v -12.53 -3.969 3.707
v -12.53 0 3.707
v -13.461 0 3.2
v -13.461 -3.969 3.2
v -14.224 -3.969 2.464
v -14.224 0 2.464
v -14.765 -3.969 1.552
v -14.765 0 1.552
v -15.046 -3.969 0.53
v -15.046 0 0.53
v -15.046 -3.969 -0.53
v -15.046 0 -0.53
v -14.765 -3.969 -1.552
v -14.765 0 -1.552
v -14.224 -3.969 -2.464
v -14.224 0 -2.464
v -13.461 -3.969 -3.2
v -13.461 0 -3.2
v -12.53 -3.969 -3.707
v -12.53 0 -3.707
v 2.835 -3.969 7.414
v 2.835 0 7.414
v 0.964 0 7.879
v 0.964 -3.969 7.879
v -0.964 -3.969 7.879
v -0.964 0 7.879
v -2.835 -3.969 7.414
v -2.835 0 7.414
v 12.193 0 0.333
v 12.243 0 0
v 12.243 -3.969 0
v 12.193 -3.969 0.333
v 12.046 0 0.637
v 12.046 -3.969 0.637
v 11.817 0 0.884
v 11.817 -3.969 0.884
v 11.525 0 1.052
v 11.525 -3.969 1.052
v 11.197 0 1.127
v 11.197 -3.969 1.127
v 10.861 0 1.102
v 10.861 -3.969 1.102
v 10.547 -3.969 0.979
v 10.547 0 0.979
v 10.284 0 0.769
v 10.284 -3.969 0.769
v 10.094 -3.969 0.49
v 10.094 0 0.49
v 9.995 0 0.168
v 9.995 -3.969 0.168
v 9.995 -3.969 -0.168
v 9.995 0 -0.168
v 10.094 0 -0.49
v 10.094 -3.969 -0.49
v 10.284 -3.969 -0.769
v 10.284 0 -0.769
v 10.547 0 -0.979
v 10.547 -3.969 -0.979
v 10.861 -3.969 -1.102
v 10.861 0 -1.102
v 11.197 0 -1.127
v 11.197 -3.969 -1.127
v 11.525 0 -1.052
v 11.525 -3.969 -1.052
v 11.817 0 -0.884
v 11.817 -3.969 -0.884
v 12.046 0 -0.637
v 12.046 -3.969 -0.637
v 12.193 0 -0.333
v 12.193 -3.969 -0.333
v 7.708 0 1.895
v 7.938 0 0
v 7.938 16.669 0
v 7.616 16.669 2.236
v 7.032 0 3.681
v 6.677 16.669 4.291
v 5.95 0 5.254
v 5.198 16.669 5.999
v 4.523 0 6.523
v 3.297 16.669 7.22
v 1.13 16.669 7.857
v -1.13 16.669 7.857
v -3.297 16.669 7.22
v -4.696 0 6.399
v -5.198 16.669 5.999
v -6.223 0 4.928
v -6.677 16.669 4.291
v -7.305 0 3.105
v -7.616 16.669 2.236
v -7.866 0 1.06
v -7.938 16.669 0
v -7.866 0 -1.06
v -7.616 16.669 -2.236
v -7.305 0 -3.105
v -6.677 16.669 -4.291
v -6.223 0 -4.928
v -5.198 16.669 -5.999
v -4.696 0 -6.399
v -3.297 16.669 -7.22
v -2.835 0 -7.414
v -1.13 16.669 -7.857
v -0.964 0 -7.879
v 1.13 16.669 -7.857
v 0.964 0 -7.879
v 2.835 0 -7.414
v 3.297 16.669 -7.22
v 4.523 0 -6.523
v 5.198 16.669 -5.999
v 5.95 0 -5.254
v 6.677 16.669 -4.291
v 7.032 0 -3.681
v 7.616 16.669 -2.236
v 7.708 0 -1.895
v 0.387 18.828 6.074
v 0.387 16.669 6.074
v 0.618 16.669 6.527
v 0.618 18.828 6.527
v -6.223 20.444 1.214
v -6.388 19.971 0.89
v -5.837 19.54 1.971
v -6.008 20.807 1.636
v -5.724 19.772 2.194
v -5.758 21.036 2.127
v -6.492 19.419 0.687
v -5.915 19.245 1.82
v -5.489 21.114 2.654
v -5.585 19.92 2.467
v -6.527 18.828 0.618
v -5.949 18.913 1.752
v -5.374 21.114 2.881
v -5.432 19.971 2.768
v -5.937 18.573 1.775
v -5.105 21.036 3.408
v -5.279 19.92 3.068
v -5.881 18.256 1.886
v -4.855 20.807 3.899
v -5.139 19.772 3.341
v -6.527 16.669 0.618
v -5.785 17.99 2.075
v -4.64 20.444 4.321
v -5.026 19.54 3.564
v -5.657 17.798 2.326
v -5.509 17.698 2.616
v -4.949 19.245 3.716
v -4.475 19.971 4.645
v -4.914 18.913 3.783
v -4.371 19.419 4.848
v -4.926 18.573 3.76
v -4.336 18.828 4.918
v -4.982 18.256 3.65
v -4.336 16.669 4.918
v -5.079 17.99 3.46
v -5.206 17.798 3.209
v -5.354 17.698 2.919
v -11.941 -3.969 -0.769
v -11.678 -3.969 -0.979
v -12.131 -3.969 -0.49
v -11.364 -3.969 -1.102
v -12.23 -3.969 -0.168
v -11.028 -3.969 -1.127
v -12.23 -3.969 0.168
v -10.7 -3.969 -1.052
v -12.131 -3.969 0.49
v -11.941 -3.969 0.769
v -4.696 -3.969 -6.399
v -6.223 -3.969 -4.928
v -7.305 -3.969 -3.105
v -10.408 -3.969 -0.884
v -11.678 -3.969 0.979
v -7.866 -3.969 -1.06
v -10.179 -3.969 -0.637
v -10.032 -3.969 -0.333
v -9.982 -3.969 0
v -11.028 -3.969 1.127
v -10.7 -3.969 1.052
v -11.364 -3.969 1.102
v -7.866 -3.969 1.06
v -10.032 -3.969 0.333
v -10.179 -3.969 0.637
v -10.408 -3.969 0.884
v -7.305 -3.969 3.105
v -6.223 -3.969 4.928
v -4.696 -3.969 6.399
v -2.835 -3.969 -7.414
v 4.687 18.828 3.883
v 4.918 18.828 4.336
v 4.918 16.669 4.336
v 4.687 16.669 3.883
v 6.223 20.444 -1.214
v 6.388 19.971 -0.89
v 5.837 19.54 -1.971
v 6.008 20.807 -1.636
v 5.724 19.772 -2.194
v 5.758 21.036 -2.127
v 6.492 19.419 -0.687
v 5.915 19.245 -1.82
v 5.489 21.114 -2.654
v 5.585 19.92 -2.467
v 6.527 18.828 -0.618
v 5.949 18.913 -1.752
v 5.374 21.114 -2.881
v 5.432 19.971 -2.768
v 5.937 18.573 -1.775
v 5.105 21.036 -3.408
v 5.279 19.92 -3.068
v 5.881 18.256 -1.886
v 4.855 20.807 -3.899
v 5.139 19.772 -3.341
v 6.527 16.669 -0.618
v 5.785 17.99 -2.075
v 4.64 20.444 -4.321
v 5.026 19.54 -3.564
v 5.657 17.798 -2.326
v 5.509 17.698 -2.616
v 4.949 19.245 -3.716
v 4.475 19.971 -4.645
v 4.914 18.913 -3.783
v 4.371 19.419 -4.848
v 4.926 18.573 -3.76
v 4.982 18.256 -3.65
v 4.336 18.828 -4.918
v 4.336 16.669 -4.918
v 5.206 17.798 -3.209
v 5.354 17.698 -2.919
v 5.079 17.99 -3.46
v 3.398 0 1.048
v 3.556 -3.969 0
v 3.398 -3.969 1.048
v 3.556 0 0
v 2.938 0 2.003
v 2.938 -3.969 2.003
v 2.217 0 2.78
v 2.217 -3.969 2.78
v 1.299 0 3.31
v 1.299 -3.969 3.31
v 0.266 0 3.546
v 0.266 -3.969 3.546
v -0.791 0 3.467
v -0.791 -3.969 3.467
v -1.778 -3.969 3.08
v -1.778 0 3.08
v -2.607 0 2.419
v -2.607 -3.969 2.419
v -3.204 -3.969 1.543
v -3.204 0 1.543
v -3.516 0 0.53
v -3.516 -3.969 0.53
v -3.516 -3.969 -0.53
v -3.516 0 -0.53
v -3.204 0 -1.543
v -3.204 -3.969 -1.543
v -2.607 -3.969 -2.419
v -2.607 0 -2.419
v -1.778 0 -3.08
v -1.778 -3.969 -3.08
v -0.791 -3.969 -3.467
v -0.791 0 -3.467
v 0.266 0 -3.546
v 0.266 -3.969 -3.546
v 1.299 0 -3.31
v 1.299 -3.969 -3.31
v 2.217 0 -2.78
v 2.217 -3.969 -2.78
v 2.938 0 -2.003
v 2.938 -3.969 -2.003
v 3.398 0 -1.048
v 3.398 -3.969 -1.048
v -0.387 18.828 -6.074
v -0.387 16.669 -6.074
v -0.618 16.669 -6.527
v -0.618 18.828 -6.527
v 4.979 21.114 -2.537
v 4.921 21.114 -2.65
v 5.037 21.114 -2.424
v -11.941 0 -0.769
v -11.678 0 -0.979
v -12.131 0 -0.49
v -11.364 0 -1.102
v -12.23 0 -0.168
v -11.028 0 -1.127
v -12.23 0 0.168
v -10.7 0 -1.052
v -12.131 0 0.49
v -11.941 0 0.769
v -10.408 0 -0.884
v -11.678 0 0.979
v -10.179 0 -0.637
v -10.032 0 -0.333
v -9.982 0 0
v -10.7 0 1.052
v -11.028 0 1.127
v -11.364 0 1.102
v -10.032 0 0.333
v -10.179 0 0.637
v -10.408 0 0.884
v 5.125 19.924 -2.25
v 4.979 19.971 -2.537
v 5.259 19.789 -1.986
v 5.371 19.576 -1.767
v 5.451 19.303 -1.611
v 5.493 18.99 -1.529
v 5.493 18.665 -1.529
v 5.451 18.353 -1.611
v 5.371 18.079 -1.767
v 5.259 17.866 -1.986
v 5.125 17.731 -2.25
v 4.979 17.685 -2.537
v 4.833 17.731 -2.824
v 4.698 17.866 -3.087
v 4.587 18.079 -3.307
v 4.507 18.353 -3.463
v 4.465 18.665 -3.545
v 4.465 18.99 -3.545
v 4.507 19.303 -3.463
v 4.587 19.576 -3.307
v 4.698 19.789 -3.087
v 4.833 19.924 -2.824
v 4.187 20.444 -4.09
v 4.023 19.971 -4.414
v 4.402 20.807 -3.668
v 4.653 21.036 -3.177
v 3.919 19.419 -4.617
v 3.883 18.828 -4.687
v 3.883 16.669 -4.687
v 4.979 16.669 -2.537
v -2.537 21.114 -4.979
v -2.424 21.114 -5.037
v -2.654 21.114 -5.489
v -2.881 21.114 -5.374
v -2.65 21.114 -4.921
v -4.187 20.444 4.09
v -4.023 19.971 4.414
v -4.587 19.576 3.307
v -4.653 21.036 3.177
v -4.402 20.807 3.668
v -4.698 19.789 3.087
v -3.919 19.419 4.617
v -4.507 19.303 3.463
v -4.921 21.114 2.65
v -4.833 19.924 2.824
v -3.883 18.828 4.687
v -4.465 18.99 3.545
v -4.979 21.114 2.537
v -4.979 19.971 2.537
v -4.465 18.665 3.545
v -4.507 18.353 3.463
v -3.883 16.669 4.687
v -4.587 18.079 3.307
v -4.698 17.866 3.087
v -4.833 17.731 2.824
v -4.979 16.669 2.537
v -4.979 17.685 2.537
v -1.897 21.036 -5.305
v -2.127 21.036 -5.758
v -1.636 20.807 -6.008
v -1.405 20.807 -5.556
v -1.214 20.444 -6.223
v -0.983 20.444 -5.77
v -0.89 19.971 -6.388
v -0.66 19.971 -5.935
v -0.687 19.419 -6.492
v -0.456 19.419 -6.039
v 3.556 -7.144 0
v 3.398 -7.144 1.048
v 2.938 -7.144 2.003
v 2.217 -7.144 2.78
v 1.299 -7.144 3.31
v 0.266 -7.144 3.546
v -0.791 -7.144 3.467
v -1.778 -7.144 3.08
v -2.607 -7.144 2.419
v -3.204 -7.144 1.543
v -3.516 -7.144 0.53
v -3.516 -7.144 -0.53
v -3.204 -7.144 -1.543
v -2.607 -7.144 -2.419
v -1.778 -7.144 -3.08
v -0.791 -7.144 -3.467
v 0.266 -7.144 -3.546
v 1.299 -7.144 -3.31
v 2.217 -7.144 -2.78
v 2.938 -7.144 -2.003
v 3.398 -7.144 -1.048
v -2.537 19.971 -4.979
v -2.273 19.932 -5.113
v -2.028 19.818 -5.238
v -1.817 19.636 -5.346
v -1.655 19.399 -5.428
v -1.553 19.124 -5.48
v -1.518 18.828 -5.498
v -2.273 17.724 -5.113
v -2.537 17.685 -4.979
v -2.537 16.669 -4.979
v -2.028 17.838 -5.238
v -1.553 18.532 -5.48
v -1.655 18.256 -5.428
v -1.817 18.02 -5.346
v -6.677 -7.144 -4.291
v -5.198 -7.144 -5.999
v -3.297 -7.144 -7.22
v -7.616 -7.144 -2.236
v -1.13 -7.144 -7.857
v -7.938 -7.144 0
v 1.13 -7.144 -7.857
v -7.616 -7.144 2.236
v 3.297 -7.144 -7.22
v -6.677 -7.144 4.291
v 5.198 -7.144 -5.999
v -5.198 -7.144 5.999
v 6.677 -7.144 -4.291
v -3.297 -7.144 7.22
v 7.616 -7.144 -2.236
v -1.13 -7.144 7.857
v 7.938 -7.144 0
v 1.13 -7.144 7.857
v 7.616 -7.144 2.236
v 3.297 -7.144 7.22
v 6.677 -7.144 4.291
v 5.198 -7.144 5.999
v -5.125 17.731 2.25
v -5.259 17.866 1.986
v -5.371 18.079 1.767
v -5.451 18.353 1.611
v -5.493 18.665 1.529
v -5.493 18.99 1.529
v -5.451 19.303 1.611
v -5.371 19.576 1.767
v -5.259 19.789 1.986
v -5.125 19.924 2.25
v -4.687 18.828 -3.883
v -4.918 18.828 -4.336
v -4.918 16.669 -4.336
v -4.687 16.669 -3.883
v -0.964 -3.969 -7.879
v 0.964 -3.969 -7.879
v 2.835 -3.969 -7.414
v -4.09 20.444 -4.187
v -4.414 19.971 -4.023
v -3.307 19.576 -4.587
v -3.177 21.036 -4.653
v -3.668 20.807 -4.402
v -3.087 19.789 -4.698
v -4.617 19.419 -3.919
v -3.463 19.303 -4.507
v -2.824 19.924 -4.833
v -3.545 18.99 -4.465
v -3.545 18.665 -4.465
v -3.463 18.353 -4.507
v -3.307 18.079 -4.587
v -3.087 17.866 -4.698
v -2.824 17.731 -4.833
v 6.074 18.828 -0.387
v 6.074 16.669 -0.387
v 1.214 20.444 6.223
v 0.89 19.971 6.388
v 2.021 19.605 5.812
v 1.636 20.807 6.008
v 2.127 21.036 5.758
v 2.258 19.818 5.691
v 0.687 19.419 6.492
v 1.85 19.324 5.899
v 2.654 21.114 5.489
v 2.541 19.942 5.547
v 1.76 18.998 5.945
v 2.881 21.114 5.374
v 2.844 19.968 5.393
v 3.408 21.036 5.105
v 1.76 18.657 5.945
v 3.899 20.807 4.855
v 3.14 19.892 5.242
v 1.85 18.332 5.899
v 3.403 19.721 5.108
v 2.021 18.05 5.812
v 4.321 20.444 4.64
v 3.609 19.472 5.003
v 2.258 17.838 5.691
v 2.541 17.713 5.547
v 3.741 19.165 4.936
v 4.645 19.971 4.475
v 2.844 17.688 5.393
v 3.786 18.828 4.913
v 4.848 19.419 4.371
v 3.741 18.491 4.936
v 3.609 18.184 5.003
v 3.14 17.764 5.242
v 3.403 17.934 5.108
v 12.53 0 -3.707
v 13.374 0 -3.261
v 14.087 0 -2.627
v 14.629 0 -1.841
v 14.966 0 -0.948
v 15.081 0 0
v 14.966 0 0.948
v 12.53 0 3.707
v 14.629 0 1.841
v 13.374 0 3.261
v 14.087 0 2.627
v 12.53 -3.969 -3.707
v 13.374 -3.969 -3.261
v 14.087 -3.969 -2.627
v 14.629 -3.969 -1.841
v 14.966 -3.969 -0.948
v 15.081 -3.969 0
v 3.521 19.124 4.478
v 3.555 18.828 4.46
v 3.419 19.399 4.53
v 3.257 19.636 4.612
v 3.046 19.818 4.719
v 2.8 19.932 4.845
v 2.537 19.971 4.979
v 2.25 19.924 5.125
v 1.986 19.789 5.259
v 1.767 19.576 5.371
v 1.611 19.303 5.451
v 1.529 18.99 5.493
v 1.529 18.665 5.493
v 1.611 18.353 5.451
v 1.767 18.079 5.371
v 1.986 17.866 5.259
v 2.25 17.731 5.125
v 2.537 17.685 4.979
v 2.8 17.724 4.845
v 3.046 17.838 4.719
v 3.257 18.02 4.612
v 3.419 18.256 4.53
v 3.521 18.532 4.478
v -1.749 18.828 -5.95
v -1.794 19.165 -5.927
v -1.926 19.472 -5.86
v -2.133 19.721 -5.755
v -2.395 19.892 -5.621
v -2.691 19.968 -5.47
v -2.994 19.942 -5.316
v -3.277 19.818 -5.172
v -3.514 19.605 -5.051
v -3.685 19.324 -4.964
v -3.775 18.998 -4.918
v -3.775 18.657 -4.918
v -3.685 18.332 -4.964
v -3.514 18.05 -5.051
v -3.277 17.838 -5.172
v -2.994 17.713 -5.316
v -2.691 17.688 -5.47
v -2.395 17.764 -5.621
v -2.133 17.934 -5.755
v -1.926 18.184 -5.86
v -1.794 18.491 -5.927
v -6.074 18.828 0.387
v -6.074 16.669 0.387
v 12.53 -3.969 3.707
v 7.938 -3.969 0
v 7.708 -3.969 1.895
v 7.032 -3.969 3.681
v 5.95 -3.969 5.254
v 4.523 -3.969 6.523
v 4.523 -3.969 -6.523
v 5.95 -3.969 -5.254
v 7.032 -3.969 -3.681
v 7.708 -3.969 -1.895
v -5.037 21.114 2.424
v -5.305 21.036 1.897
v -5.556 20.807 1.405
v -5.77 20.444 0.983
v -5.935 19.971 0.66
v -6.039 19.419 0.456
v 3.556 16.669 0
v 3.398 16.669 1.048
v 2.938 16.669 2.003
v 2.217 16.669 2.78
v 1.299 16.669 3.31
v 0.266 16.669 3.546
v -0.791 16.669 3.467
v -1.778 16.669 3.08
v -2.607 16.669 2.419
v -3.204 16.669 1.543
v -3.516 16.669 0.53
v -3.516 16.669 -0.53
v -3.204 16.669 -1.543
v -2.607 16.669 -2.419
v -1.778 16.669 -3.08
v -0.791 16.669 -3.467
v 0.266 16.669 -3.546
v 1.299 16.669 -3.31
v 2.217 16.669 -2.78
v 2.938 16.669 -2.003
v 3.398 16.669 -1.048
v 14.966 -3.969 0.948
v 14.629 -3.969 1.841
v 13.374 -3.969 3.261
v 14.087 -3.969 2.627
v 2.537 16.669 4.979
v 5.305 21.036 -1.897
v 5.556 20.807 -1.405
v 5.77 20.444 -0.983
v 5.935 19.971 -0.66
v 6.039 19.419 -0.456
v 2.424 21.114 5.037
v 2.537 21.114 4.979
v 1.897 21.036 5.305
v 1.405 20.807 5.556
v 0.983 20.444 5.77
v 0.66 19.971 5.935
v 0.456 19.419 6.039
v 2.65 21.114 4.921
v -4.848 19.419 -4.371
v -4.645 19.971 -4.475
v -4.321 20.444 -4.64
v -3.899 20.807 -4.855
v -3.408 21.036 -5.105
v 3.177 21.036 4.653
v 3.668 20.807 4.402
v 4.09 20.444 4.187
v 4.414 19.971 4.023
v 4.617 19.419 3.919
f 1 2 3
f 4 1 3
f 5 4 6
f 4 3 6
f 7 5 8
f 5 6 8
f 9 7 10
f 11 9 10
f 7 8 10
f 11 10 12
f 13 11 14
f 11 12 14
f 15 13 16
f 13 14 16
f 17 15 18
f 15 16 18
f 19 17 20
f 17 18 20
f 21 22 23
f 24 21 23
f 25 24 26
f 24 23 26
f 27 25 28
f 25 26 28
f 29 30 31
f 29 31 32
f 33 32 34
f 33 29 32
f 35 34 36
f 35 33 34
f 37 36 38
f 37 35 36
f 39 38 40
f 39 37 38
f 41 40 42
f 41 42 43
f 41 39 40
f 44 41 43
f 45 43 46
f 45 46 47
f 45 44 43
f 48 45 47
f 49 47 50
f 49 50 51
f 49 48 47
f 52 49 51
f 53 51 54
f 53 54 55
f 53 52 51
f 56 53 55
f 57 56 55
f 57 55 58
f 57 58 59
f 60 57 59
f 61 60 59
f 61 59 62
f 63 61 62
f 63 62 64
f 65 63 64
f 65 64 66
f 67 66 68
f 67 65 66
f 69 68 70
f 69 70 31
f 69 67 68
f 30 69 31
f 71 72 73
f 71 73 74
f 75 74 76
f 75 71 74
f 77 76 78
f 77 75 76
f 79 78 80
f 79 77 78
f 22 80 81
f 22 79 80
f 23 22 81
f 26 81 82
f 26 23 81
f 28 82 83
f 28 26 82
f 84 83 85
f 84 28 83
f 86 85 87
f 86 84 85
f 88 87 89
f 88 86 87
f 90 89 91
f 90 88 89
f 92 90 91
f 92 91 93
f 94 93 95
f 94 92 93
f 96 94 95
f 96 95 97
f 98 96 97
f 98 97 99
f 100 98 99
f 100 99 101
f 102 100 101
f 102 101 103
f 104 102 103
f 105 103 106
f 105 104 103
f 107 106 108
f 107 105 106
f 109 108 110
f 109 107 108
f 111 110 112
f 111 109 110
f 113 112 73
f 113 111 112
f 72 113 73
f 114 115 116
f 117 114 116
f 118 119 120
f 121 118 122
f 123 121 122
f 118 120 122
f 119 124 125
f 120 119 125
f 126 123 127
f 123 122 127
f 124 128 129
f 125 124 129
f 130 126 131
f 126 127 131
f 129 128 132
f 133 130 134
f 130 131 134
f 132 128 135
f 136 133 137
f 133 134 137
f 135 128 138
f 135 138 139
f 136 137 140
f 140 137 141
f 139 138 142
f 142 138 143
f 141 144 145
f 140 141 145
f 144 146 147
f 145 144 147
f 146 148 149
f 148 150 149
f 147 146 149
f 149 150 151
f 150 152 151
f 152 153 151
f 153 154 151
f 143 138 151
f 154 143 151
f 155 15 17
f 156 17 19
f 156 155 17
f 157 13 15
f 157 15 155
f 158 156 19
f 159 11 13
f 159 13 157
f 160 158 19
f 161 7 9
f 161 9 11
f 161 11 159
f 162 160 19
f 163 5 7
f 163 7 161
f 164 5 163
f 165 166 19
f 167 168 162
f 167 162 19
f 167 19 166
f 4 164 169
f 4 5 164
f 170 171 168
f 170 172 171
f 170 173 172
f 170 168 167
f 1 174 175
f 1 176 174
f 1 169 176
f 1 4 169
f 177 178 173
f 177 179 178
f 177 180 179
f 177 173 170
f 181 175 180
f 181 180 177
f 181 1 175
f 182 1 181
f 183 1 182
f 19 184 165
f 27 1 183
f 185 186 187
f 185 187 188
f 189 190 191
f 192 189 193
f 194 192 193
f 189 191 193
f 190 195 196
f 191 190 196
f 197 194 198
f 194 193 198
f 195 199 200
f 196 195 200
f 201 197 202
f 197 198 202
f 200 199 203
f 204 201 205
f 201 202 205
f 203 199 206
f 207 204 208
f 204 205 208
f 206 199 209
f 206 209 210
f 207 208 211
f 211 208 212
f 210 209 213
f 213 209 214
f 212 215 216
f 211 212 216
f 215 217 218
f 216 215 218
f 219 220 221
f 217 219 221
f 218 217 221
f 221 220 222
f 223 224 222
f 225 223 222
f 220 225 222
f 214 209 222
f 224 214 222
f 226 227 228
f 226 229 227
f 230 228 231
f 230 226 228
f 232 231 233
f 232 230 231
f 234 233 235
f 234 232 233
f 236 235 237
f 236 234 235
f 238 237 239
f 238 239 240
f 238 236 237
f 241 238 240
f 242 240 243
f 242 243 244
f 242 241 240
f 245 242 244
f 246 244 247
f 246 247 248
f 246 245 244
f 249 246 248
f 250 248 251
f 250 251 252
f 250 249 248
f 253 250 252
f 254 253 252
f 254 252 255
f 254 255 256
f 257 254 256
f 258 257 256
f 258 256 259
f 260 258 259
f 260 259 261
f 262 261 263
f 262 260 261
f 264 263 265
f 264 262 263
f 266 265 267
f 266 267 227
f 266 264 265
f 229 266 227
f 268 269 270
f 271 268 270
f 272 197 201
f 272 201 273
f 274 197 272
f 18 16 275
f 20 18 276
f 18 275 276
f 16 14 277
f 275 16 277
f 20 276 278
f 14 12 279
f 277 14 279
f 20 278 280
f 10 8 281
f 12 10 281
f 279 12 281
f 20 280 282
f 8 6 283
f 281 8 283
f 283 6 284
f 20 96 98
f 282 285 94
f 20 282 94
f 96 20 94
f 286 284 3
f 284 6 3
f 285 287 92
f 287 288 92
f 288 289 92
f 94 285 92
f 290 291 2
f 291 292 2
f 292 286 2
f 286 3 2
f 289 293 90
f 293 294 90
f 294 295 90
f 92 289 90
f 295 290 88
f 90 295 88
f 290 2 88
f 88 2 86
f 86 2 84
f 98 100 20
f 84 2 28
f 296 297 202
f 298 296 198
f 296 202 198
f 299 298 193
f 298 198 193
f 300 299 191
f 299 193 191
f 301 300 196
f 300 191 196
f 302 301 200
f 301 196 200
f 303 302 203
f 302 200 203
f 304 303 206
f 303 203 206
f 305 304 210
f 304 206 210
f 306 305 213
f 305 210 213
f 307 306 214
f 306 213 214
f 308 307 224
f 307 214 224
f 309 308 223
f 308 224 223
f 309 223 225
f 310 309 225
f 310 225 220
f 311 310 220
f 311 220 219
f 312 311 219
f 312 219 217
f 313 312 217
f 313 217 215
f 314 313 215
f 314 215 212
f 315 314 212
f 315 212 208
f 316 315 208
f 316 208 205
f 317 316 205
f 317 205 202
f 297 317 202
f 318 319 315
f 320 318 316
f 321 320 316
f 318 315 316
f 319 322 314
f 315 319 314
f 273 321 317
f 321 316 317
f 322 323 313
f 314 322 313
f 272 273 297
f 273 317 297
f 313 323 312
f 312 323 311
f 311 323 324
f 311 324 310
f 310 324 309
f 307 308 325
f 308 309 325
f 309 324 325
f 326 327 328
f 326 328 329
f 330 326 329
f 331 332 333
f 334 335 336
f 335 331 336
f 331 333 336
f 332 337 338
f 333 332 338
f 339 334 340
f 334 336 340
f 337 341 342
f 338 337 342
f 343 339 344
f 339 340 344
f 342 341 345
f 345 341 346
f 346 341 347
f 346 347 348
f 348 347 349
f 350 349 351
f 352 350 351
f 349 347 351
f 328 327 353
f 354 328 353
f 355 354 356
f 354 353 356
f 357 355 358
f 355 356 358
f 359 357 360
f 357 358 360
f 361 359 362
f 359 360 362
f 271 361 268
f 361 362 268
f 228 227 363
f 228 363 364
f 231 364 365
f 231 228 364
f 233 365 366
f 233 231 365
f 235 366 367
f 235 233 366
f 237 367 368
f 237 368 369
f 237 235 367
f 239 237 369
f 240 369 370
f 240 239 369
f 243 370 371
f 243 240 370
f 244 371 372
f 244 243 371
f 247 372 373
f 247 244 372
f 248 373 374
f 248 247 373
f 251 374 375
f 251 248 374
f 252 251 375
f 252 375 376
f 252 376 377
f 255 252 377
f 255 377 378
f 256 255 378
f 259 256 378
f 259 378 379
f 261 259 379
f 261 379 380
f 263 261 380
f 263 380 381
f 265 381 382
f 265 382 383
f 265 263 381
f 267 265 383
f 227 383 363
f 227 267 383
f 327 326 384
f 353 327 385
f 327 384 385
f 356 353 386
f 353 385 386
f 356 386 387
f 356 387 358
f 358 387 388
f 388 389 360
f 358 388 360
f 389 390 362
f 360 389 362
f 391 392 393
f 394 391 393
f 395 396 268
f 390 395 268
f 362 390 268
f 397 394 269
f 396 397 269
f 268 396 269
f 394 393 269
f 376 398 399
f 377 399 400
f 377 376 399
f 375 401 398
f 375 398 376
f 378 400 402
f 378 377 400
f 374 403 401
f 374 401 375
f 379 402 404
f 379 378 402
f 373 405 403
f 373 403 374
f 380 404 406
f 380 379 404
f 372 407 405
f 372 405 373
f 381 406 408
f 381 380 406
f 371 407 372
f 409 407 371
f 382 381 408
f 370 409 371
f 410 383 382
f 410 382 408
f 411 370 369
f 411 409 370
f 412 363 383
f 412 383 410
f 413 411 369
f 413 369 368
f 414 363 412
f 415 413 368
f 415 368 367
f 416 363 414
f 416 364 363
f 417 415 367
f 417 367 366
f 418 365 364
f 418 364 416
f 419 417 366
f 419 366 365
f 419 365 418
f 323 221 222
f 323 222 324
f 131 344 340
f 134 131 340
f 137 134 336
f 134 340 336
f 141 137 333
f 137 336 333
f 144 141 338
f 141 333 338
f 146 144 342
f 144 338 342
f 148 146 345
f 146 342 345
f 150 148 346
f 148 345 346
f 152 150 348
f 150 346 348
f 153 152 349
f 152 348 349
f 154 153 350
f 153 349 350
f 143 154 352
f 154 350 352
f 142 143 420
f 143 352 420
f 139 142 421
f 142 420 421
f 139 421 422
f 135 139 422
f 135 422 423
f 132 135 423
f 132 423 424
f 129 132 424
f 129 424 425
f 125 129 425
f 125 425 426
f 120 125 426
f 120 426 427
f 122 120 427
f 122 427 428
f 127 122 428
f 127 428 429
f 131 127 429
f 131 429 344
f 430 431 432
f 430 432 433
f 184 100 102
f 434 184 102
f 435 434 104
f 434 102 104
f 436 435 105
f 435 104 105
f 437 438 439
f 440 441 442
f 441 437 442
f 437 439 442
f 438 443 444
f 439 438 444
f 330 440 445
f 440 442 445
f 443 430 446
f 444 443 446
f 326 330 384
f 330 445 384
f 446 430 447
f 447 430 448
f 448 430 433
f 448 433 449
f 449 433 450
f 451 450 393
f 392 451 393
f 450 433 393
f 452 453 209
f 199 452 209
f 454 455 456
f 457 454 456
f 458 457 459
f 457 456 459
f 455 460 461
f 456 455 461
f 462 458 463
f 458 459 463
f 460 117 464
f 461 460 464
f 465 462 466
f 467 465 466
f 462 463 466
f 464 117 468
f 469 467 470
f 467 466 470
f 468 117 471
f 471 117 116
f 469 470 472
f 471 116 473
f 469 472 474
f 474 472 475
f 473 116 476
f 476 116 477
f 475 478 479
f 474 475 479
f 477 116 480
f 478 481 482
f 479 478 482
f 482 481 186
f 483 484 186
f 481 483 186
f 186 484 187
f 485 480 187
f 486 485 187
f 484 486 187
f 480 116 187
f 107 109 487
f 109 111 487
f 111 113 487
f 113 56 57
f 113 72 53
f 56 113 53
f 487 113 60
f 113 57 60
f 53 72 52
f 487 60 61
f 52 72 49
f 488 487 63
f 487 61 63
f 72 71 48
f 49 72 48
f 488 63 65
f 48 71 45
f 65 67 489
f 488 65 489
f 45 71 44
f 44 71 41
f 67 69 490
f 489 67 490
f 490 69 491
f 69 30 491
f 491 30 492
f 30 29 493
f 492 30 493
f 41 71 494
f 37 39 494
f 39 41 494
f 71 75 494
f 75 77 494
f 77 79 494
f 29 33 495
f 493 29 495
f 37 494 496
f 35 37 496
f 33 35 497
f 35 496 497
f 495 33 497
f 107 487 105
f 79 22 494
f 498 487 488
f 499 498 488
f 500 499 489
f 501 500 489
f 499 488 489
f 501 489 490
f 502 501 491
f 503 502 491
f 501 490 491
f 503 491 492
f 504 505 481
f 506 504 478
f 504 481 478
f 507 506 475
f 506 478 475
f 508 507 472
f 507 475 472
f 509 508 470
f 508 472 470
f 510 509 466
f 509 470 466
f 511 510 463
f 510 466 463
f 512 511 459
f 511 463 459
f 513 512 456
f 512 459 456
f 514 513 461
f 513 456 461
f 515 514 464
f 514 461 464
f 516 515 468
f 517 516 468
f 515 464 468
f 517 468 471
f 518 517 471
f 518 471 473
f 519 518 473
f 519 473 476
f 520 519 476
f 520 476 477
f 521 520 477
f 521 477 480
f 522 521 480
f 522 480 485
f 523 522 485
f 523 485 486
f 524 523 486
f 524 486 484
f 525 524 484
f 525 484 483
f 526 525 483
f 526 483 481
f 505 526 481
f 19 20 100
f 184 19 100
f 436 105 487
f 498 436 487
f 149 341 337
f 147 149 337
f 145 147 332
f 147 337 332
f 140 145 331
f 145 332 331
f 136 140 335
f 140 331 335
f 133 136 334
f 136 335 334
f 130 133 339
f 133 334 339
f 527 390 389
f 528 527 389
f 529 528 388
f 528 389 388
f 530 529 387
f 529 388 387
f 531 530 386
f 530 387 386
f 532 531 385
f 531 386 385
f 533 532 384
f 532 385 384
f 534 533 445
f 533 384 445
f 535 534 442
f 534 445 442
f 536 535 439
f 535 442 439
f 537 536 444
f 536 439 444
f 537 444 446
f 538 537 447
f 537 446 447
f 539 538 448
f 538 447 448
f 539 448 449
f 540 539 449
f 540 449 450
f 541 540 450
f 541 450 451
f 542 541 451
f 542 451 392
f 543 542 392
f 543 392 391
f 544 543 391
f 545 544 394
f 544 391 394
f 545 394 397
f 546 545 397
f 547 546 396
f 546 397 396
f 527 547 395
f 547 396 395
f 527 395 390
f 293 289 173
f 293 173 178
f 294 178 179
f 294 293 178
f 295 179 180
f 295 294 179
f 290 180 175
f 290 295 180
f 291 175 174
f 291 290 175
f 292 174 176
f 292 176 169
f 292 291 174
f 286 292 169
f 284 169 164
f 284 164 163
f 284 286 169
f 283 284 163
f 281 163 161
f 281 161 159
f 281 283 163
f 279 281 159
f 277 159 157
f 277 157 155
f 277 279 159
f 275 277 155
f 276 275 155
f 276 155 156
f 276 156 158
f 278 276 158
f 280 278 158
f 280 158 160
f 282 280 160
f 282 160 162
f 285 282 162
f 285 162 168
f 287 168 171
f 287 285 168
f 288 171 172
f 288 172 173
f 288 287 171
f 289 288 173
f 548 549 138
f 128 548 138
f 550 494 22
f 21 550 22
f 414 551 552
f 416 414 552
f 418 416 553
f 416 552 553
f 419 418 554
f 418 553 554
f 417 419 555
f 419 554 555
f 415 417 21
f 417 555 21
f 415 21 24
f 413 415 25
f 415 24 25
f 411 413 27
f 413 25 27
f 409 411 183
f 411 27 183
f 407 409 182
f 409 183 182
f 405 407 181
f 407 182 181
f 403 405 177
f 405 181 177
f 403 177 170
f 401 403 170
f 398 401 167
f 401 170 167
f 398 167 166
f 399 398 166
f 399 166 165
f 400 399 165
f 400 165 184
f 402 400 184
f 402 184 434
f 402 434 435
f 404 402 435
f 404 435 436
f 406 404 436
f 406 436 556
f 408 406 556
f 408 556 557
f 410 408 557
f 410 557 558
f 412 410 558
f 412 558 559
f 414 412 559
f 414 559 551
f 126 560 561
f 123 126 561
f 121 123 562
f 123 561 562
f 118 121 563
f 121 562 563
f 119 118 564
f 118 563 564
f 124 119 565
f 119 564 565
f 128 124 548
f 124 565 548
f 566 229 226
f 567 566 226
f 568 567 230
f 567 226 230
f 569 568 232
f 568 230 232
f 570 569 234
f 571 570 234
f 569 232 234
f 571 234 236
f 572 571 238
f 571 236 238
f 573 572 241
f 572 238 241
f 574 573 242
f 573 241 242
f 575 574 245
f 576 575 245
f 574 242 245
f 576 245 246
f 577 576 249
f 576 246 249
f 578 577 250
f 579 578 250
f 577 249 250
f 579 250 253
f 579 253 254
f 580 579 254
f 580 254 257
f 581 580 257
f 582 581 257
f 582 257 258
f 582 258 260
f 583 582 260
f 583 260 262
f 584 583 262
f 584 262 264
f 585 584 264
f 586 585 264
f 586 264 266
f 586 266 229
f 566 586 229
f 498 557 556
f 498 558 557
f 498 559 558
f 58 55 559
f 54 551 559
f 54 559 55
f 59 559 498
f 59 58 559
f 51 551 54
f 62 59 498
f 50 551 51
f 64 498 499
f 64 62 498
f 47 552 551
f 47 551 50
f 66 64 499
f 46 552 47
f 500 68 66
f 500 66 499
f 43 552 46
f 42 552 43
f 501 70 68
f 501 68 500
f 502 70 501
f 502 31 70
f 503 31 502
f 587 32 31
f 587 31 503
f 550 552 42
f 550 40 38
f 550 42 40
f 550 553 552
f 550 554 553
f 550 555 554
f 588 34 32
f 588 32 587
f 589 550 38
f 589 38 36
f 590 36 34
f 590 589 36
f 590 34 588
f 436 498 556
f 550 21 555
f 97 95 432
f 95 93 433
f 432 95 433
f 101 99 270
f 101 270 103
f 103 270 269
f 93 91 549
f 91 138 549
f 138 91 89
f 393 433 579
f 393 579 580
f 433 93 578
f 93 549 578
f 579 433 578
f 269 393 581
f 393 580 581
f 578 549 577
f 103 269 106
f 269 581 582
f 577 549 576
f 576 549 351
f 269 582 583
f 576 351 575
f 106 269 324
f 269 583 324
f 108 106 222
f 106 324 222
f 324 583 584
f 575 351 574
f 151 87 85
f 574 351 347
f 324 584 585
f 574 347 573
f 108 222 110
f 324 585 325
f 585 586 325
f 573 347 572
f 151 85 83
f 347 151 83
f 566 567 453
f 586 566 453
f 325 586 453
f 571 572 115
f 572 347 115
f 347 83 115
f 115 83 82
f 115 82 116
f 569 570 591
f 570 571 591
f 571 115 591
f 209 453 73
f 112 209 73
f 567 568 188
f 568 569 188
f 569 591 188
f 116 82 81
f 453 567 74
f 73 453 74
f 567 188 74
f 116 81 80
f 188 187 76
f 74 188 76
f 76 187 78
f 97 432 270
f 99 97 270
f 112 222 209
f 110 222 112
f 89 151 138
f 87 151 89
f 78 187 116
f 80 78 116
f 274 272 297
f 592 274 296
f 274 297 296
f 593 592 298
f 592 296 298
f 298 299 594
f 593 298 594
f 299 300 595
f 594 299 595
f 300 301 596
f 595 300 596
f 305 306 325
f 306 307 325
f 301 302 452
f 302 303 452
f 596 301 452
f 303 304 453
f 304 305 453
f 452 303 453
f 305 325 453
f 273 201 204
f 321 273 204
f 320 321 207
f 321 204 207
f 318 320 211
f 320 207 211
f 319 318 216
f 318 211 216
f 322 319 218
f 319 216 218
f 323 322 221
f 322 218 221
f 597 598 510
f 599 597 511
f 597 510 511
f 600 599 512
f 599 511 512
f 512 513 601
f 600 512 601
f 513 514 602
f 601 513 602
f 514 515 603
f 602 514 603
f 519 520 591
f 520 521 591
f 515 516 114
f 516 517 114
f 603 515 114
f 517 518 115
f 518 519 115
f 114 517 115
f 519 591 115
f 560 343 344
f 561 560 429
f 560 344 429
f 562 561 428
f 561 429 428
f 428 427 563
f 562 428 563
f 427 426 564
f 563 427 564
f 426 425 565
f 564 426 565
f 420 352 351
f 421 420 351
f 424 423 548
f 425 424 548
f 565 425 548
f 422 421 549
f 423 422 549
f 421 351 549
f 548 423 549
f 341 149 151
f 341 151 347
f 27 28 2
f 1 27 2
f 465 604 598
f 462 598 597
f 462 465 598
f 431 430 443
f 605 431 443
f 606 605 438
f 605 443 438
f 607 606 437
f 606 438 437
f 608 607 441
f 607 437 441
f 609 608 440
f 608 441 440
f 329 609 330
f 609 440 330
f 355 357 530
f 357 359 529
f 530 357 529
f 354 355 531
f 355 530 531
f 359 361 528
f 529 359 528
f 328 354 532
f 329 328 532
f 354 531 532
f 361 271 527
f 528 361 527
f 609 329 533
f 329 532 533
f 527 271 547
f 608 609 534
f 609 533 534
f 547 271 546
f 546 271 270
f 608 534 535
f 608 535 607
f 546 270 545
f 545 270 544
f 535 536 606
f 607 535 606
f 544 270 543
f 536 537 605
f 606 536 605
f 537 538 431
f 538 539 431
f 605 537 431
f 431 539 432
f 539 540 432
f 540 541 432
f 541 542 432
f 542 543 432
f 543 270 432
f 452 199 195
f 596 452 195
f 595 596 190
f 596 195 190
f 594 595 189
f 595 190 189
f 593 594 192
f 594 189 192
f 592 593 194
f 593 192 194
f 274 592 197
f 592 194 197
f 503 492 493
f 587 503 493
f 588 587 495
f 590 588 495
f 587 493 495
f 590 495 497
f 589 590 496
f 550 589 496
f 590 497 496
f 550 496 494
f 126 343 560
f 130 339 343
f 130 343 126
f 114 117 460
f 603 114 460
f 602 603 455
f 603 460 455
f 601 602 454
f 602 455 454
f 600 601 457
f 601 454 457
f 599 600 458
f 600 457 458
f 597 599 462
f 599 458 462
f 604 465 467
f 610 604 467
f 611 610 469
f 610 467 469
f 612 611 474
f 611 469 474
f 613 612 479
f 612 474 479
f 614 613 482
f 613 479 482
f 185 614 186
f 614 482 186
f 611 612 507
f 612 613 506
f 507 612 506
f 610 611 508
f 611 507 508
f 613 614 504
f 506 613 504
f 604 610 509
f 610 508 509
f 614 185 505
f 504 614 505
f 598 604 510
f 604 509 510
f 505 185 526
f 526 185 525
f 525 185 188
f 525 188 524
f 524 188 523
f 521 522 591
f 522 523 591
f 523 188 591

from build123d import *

# Parameters (mm, degrees)
F0_R          = 1.1303
F0_R_2        = 3.556
F1_DEPTH      = 3.96875
F2_R          = 7.9375
F2_R_2        = 3.556
F3_DEPTH      = 3.175
F3_DEPTH_BACK = 20.6375
F5_DEPTH      = 4.445
F6_R          = 1.143
F7_DEPTH      = 20.0161085099
F8_R          = 1.143
F9_DEPTH      = 23.1380417346


with BuildPart() as f1:
    # F0 (on Front) → F1 (new body)
    with BuildSketch(Plane.XZ):
        with BuildLine():
            ThreePointArc((-7.6823660714, -1.9962860002), (-7.9375, 0), (-7.6823660714, 1.9962860002))
            ThreePointArc((-7.6823660714, 1.9962860002), (-9.7917396627, 3.7425350625), (-12.5299107143, 3.707010039))
            ThreePointArc((-12.5299107143, 3.707010039), (-15.08125, 0), (-12.5299107143, -3.707010039))
            ThreePointArc((-12.5299107143, -3.707010039), (-9.7917396627, -3.7425350625), (-7.6823660714, -1.9962860002))
        make_face()
        with Locations((-11.1125, 0)):
            Circle(F0_R, mode=Mode.SUBTRACT)
        with BuildLine():
            ThreePointArc((12.5299107143, 3.707010039), (9.7917396627, 3.7425350625), (7.6823660714, 1.9962860002))
            ThreePointArc((7.6823660714, 1.9962860002), (7.8734581647, 1.0062617845), (7.9375, 0))
            ThreePointArc((7.9375, 0), (7.8734581647, -1.0062617845), (7.6823660714, -1.9962860002))
            ThreePointArc((7.6823660714, -1.9962860002), (9.7917396627, -3.7425350625), (12.5299107143, -3.707010039))
            ThreePointArc((12.5299107143, -3.707010039), (14.381775557, -2.2500697534), (15.08125, 0))
            ThreePointArc((15.08125, 0), (14.381775557, 2.2500697534), (12.5299107143, 3.707010039))
        make_face()
        with Locations((11.1125, 0)):
            Circle(F0_R, mode=Mode.SUBTRACT)
        with BuildLine():
            ThreePointArc((7.6823660714, 1.9962860002), (5.9152995581, 5.292743843), (2.8348214286, 7.4140200781))
            ThreePointArc((2.8348214286, 7.4140200781), (0, 7.9375), (-2.8348214286, 7.4140200781))
            ThreePointArc((-2.8348214286, 7.4140200781), (-5.9152995581, 5.292743843), (-7.6823660714, 1.9962860002))
            ThreePointArc((-7.6823660714, 1.9962860002), (-7.2807692819, 1.0338357059), (-7.14375, 0))
            ThreePointArc((-7.14375, 0), (-7.2807692819, -1.0338357059), (-7.6823660714, -1.9962860002))
            ThreePointArc((-7.6823660714, -1.9962860002), (-5.9152995581, -5.292743843), (-2.8348214286, -7.4140200781))
            ThreePointArc((-2.8348214286, -7.4140200781), (0, -7.9375), (2.8348214286, -7.4140200781))
            ThreePointArc((2.8348214286, -7.4140200781), (5.9152995581, -5.292743843), (7.6823660714, -1.9962860002))
            ThreePointArc((7.6823660714, -1.9962860002), (7.14375, 0), (7.6823660714, 1.9962860002))
        make_face()
        Circle(F0_R_2, mode=Mode.SUBTRACT)
        with BuildLine():
            ThreePointArc((-7.14375, 0), (-7.2807692819, 1.0338357059), (-7.6823660714, 1.9962860002))
            ThreePointArc((-7.6823660714, 1.9962860002), (-7.9375, 0), (-7.6823660714, -1.9962860002))
            ThreePointArc((-7.6823660714, -1.9962860002), (-7.2807692819, -1.0338357059), (-7.14375, 0))
        make_face()
        with BuildLine():
            ThreePointArc((7.9375, 0), (7.8734581647, 1.0062617845), (7.6823660714, 1.9962860002))
            ThreePointArc((7.6823660714, 1.9962860002), (7.14375, 0), (7.6823660714, -1.9962860002))
            ThreePointArc((7.6823660714, -1.9962860002), (7.8734581647, -1.0062617845), (7.9375, 0))
        make_face()
        with BuildLine():
            Line((12.5299107143, 3.707010039), (2.8348214286, 7.4140200781))
            ThreePointArc((2.8348214286, 7.4140200781), (5.9152995581, 5.292743843), (7.6823660714, 1.9962860002))
            ThreePointArc((7.6823660714, 1.9962860002), (9.7917396627, 3.7425350625), (12.5299107143, 3.707010039))
        make_face()
        with BuildLine():
            ThreePointArc((-7.6823660714, 1.9962860002), (-5.9152995581, 5.292743843), (-2.8348214286, 7.4140200781))
            Line((-2.8348214286, 7.4140200781), (-12.5299107143, 3.707010039))
            ThreePointArc((-12.5299107143, 3.707010039), (-9.7917396627, 3.7425350625), (-7.6823660714, 1.9962860002))
        make_face()
        with BuildLine():
            ThreePointArc((-2.8348214286, -7.4140200781), (-5.9152995581, -5.292743843), (-7.6823660714, -1.9962860002))
            ThreePointArc((-7.6823660714, -1.9962860002), (-9.7917396627, -3.7425350625), (-12.5299107143, -3.707010039))
            Line((-12.5299107143, -3.707010039), (-2.8348214286, -7.4140200781))
        make_face()
        with BuildLine():
            ThreePointArc((12.5299107143, -3.707010039), (9.7917396627, -3.7425350625), (7.6823660714, -1.9962860002))
            ThreePointArc((7.6823660714, -1.9962860002), (5.9152995581, -5.292743843), (2.8348214286, -7.4140200781))
            Line((2.8348214286, -7.4140200781), (12.5299107143, -3.707010039))
        make_face()
    extrude(amount=F1_DEPTH)

    # F2 (on face) → F3 (join, two sides)
    with BuildSketch(Plane.XZ.offset(3.96875)) as f3_sk:
        Circle(F2_R)
        Circle(F2_R_2, mode=Mode.SUBTRACT)
    extrude(amount=F3_DEPTH)
    extrude(f3_sk.sketch, amount=-F3_DEPTH_BACK)

    # F4 (on face) → F5 (join)
    with BuildSketch(Plane(origin=(0, 16.66875, 0), x_dir=(-1, 0, 0), z_dir=(0, 1, 0))):
        Polygon((-4.6868976554, 3.8834653813), (-2.5368989125, 4.9789444572), (-0.3869001697, 6.074423533), (-0.6175273435, 6.5270548473), (-4.9175248293, 4.3360966956), align=None)
        Polygon((-6.074423533, -0.3869001697), (-6.5270548473, -0.6175273435), (-4.3360966956, -4.9175248293), (-3.8834653813, -4.6868976554), (-4.9789444572, -2.5368989125), align=None)
        Polygon((0.3869001697, -6.074423533), (0.6175273435, -6.5270548473), (4.9175248293, -4.3360966956), (4.6868976554, -3.8834653813), (2.5368989125, -4.9789444572), align=None)
        Polygon((6.074423533, 0.3869001697), (6.5270548473, 0.6175273435), (4.3360966956, 4.9175248293), (3.8834653813, 4.6868976554), (4.9789444572, 2.5368989125), align=None)
    extrude(amount=F5_DEPTH)

    # F6 (on face) → F7 (cut, through all)
    with BuildSketch(Plane(origin=(2.7675260864, 0, 5.4315757715), x_dir=(0.8910065242, 0, -0.4539904997), z_dir=(0.4539904997, 0, 0.8910065242))):
        with BuildLine():
            Line((-2.413, 21.11375), (-2.413, 18.82775))
            ThreePointArc((-2.413, 18.82775), (-1.7434461018, 20.4441961018), (-0.127, 21.11375))
            Line((-0.127, 21.11375), (-2.413, 21.11375))
        make_face()
        with Locations((0, 18.82775)):
            Circle(F6_R)
        with BuildLine():
            ThreePointArc((0.127, 21.11375), (1.7434461018, 20.4441961018), (2.413, 18.82775))
            Line((2.413, 18.82775), (2.413, 21.11375))
            Line((2.413, 21.11375), (0.127, 21.11375))
        make_face()
    extrude(amount=-F7_DEPTH, mode=Mode.SUBTRACT)

    # F8 (on face) → F9 (cut, through all)
    with BuildSketch(Plane(origin=(5.4315757715, 0, -2.7675260864), x_dir=(0, 1, 0), z_dir=(0.8910065242, 0, -0.4539904997))):
        with BuildLine():
            Line((21.11375, 0.127), (21.11375, 2.413))
            Line((21.11375, 2.413), (18.82775, 2.413))
            ThreePointArc((18.82775, 2.413), (20.4441961018, 1.7434461018), (21.11375, 0.127))
        make_face()
        with Locations((18.82775, 0)):
            Circle(F8_R)
        with BuildLine():
            Line((21.11375, -2.413), (21.11375, -0.127))
            ThreePointArc((21.11375, -0.127), (20.4441961018, -1.7434461018), (18.82775, -2.413))
            Line((18.82775, -2.413), (21.11375, -2.413))
        make_face()
    extrude(amount=-F9_DEPTH, mode=Mode.SUBTRACT)


solid = f1.part
